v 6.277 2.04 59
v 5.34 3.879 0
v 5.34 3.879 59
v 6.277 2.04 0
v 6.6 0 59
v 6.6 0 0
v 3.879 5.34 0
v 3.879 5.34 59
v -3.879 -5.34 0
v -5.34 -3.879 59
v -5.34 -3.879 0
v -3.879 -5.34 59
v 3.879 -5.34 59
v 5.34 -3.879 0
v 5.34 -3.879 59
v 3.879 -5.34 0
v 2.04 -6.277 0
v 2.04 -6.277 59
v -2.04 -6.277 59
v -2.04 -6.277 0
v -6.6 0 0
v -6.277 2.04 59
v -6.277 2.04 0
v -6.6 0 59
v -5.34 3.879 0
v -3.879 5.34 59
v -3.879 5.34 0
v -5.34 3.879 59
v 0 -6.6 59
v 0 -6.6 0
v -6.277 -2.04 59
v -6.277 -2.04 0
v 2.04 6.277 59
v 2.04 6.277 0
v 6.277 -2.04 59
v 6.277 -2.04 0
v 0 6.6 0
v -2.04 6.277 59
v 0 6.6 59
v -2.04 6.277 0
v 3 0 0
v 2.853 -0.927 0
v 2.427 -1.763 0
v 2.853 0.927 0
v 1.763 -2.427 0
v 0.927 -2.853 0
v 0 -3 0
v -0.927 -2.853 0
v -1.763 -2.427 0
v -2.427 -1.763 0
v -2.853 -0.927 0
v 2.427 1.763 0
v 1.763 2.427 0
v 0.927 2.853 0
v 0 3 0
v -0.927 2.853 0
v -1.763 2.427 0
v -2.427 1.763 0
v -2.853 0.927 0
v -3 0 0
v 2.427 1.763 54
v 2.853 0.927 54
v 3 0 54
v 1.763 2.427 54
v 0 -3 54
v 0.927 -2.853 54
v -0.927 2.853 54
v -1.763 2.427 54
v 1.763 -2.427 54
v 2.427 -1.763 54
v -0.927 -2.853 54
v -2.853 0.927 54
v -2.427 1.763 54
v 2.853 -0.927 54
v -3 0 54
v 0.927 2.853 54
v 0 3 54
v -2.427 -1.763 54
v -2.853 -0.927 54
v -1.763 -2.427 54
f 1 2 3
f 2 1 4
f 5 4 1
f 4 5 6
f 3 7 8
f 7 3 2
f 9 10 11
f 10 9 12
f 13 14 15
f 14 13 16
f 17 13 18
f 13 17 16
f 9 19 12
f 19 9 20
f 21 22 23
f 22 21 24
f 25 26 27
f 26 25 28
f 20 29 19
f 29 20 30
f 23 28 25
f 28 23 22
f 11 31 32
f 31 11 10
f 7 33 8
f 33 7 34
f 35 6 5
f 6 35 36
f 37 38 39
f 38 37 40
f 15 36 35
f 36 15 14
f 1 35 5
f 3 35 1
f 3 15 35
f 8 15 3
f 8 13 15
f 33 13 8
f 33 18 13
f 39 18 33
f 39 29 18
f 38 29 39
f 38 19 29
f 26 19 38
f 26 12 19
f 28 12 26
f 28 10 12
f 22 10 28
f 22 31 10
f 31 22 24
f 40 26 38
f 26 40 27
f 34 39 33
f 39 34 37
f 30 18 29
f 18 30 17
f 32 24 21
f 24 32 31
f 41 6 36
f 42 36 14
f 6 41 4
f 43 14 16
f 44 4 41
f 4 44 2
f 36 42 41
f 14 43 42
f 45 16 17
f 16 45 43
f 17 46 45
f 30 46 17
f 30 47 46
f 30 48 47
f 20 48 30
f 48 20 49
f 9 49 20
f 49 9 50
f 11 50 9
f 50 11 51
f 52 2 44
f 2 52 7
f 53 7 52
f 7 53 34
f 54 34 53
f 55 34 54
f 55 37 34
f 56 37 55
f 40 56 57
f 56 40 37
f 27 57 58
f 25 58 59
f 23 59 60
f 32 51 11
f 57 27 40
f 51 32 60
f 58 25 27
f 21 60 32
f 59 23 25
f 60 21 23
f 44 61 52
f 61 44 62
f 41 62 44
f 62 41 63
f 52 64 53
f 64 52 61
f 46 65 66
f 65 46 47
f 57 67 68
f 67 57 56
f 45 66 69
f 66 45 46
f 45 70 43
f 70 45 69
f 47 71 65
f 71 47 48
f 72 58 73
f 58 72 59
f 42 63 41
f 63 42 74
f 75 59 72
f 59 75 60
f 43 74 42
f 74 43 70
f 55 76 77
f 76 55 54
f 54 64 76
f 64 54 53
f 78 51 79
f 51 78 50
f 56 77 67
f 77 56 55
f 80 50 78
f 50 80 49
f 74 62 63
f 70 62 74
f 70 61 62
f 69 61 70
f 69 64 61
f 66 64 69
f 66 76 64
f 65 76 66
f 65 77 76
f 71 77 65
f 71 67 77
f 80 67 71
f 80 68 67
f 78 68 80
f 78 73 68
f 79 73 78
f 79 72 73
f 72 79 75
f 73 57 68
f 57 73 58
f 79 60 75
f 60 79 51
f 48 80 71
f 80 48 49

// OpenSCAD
$fn=20;

difference(){
    cylinder(75-21+5, d=13.2);
    cylinder(75-21, d=6);
//    translate([9.7-0.2,0,0])cube([13.2,13.2,21*2], true);
}

//difference(){
//    translate([0,0,-18])  cylinder(18, d1=4, d2=13.2);
//    translate([0,0,-18]) cylinder(18, d1=3, d2=3.5);
//    
//}
    
